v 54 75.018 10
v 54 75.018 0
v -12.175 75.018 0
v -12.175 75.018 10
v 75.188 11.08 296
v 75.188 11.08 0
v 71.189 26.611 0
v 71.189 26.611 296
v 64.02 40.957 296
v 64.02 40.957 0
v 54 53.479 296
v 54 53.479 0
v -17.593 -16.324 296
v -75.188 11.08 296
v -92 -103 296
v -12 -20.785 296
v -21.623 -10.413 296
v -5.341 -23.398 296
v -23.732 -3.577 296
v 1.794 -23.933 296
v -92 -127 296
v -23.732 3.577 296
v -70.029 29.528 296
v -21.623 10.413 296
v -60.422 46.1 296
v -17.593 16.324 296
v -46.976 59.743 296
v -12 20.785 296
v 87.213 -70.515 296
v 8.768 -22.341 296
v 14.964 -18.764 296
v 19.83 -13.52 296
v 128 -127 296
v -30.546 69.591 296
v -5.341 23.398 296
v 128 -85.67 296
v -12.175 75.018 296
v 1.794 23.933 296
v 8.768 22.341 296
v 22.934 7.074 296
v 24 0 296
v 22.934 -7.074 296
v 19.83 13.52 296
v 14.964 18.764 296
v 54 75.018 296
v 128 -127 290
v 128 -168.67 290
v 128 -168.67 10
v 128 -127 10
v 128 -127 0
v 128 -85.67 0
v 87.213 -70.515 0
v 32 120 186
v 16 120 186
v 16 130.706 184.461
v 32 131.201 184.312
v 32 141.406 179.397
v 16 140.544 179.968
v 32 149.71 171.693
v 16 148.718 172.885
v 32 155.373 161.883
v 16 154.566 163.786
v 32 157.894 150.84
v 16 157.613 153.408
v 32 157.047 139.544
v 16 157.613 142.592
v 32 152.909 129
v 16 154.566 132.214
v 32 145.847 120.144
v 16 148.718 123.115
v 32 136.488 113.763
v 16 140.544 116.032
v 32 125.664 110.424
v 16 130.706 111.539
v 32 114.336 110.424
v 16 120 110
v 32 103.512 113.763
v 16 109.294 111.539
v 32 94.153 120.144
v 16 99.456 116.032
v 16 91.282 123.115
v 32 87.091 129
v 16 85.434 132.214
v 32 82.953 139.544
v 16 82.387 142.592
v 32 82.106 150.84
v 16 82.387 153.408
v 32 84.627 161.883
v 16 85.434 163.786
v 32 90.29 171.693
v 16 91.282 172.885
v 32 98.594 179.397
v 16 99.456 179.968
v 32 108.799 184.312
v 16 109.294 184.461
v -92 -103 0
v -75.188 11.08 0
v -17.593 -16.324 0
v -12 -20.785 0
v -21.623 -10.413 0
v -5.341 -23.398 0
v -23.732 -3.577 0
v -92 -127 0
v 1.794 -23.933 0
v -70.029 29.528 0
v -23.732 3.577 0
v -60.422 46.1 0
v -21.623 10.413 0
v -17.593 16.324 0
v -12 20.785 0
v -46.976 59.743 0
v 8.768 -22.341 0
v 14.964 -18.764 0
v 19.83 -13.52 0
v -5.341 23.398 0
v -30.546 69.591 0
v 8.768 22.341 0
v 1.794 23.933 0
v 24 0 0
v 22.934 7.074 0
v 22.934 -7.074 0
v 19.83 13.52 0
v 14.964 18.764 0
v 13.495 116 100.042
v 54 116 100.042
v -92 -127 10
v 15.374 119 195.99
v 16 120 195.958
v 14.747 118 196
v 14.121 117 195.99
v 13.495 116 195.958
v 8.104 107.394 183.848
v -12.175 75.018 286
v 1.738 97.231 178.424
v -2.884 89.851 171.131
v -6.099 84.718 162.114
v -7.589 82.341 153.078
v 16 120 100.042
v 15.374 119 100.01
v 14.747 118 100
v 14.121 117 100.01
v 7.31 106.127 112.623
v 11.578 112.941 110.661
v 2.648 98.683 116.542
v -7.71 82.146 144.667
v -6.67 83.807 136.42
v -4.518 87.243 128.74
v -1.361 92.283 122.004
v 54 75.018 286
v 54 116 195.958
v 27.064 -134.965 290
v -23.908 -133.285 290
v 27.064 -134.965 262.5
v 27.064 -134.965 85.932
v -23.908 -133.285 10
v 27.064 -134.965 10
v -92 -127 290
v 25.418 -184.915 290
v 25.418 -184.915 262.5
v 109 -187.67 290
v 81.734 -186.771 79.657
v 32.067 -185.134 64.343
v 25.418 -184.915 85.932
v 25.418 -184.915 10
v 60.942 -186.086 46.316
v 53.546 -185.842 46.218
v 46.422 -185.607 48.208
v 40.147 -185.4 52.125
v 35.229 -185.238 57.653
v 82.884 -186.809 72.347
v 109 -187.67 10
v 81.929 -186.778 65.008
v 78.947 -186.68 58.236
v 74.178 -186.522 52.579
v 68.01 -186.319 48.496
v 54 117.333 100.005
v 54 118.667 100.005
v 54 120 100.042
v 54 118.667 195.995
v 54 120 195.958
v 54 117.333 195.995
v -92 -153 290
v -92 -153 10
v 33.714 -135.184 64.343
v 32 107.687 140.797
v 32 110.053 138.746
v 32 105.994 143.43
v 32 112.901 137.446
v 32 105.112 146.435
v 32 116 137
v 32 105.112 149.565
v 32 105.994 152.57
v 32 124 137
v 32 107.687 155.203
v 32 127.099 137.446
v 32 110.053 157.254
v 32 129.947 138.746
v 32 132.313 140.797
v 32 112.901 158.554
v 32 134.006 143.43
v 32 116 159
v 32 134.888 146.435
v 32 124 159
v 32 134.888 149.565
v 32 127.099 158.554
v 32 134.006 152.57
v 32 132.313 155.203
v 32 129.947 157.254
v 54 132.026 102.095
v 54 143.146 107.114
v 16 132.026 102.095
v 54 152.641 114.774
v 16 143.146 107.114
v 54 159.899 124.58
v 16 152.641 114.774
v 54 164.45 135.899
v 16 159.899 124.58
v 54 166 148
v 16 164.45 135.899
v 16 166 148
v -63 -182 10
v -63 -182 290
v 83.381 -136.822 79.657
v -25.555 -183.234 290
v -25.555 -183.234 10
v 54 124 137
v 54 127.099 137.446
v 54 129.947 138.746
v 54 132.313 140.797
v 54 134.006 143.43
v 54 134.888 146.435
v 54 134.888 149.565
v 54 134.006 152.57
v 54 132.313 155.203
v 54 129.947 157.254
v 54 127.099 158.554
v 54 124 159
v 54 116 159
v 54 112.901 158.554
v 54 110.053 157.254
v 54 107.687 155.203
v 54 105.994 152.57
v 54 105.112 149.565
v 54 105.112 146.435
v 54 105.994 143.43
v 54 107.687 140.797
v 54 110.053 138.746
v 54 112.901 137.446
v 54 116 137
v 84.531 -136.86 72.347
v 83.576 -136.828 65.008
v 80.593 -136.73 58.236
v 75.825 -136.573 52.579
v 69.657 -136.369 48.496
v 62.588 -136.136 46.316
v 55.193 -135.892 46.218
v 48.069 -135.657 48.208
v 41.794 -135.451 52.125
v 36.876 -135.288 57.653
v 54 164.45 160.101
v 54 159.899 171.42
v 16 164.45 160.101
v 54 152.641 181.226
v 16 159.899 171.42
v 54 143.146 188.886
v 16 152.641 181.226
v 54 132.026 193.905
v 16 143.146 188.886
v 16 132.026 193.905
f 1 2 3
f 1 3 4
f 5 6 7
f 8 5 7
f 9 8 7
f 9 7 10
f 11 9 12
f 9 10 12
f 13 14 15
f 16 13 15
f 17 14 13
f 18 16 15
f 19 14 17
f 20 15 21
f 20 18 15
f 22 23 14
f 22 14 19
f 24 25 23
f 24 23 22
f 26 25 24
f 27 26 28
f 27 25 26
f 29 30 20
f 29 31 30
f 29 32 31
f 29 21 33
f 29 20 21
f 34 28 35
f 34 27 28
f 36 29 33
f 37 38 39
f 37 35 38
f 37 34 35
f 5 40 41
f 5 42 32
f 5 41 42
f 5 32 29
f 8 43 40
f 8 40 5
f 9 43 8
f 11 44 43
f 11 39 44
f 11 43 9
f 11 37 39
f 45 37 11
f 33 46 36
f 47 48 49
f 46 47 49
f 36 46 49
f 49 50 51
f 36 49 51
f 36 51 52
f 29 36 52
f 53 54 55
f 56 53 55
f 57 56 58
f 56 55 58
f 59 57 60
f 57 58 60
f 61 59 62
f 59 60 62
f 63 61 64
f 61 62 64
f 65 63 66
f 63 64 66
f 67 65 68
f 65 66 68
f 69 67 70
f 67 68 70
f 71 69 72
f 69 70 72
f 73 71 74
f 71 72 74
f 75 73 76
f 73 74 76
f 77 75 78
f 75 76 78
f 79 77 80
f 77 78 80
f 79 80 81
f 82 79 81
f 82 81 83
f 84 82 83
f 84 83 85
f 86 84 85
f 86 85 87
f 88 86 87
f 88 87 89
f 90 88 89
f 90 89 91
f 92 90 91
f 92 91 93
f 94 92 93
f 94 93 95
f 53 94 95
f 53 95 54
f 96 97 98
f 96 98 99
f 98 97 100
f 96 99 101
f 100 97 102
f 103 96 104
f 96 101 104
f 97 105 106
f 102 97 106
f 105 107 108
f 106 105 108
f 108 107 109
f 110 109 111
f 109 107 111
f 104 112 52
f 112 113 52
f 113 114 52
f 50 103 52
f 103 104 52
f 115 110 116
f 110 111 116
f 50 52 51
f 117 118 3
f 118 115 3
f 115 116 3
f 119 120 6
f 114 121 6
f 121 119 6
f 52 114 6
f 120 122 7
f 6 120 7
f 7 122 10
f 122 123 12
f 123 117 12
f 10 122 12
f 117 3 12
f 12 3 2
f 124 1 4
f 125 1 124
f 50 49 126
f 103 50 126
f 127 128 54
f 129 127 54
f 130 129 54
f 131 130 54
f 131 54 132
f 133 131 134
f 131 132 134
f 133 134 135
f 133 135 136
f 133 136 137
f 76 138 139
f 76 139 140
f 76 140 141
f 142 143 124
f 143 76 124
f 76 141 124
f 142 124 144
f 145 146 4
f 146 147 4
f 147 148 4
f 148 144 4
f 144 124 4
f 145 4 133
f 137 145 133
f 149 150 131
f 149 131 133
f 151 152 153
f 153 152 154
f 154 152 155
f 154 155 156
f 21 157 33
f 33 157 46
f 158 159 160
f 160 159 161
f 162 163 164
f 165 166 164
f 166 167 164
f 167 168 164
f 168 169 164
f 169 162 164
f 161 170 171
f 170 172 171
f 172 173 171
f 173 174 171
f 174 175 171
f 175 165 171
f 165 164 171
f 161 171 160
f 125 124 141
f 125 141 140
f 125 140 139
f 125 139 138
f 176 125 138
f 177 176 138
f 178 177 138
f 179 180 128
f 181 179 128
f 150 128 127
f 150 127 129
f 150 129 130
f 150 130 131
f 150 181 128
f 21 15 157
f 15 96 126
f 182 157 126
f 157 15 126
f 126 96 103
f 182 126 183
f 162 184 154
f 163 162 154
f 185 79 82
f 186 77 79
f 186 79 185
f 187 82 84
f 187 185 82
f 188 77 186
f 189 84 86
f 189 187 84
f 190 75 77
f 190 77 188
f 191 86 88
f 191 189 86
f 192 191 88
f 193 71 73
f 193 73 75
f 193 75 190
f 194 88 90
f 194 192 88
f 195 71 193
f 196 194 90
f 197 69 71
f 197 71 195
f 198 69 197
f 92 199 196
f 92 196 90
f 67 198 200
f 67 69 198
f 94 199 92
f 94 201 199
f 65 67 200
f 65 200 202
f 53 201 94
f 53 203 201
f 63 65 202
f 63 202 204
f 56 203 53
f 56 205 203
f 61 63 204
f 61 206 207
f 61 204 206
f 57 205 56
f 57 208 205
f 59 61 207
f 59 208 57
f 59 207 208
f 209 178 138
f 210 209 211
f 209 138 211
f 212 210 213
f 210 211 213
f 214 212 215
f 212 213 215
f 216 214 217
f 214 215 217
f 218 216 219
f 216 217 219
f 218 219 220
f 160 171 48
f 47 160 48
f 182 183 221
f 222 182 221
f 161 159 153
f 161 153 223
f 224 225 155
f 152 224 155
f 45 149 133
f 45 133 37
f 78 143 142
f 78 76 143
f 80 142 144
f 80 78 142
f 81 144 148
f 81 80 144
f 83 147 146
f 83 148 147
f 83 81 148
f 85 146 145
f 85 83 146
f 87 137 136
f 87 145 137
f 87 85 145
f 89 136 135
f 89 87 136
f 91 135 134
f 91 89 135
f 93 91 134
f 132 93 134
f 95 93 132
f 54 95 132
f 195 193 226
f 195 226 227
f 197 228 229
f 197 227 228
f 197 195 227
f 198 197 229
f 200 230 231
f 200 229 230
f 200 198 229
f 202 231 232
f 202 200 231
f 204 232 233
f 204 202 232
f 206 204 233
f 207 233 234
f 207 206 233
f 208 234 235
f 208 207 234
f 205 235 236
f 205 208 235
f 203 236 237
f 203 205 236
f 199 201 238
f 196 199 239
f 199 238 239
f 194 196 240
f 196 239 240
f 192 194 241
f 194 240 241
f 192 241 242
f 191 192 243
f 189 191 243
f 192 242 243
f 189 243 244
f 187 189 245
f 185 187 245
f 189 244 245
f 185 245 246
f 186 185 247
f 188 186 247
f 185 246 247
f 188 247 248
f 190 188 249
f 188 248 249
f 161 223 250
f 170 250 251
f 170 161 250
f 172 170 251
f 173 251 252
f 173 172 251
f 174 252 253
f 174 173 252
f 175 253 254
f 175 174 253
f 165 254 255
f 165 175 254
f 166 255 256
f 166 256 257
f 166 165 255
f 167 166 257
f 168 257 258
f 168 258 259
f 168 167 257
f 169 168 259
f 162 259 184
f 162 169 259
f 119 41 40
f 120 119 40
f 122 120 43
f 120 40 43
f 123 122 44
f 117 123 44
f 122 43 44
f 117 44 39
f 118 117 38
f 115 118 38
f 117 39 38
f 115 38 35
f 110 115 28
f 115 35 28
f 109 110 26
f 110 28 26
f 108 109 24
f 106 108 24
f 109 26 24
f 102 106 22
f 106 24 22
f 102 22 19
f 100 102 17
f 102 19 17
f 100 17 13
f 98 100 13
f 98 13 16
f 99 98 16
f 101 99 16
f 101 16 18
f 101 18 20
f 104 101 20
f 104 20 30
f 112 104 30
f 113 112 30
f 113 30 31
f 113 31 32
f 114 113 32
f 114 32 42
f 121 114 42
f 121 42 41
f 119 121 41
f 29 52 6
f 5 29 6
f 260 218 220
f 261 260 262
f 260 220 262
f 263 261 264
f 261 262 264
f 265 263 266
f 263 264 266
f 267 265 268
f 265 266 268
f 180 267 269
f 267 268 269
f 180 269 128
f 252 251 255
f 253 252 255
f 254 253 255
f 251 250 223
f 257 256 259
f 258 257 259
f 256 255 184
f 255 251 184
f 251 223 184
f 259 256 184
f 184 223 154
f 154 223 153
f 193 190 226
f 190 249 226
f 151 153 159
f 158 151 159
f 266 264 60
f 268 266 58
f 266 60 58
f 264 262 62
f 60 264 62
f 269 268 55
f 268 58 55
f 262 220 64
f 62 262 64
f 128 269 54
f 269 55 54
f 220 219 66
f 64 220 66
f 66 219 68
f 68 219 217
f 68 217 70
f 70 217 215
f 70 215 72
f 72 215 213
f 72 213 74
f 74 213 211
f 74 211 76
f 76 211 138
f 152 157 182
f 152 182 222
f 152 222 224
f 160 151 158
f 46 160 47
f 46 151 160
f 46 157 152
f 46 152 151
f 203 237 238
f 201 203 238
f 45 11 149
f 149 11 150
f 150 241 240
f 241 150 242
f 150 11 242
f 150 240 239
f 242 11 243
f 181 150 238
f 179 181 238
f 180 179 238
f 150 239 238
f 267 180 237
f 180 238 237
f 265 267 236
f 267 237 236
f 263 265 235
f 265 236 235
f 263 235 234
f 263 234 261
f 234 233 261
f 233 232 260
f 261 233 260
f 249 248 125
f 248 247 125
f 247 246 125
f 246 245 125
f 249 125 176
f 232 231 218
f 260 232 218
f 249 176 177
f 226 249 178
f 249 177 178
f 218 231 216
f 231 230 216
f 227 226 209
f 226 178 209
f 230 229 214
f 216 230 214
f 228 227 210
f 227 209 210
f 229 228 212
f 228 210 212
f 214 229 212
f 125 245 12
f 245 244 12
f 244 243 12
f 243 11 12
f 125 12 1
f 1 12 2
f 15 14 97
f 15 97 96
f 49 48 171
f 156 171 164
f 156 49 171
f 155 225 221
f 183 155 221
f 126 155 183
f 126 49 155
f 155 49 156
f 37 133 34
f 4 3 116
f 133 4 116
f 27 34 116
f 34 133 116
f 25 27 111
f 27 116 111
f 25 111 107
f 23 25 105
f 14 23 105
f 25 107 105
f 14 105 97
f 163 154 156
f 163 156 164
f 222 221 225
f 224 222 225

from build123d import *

# Parameters (mm, degrees)
EXTRUDE_1_DEPTH                  = 296
CUT_EXTRUDE_1_REACH              = 375.122
SKETCH_2_R                       = 24
EXTRUDE_START                    = -296
EXTRUDE_2_DEPTH                  = 296
CUT_EXTRUDE_2_REACH              = 369.94
CUT_EXTRUDE_2_DIRECTION_2_REACH  = 369.94
SKETCH_5_R                       = 38
CUT_EXTRUDE_4_DEPTH              = 16
CUT_EXTRUDE_4_DIRECTION_2_REACH  = 369.94
CUT_EXTRUDE_10_REACH             = 369.94
CUT_EXTRUDE_11_REACH             = 369.94
CUT_EXTRUDE_12_REACH             = 369.94
CUT_EXTRUDE_12_DIRECTION_2_REACH = 369.94
CUT_EXTRUDE_1_2_DEPTH            = 374.122168517
CUT_EXTRUDE_1_2_DEPTH_BACK       = 6
SKETCH_10_W                      = 353.554121084
SKETCH_10_H                      = 70
CUT_EXTRUDE_2_2_DEPTH            = 374.122168517
CUT_EXTRUDE_2_2_DEPTH_BACK       = 10
SKETCH_11_W                      = 315.319296241
SKETCH_11_H                      = 70
CUT_EXTRUDE_13_DEPTH             = 49.976974814


with BuildPart() as part:
    # 草图1 → 凸台-拉伸1 (new body)
    with BuildSketch(Plane.XY):
        with BuildLine():
            Line((-75.187918949, 11.080471294), (-92, -103))
            Line((-92, -103), (-92, -153))
            Line((-92, -153), (-63, -182))
            Line((-63, -182), (-25.55454992, -183.234465387))
            Line((-25.55454992, -183.234465387), (-23.907851937, -133.284626575))
            Line((-23.907851937, -133.284626575), (27.064456588, -134.965032351))
            Line((27.064456588, -134.965032351), (25.417758605, -184.914871163))
            Line((25.417758605, -184.914871163), (109, -187.67032967))
            Line((109, -187.67032967), (128, -168.67032967))
            Line((128, -168.67032967), (128, -85.67032967))
            Line((128, -85.67032967), (87.212696765, -70.515157246))
            Line((87.212696765, -70.515157246), (75.187918949, 11.080471294))
            ThreePointArc((75.187918949, 11.080471294), (0, 76), (-75.187918949, 11.080471294))
        make_face()
    extrude(amount=EXTRUDE_1_DEPTH)

    # 草图2 → Cut-Extrude 1 (cut, up to next)
    with BuildSketch(Plane.XY.offset(296), mode=Mode.PRIVATE) as cut_extrude_1_sk1:
        Circle(SKETCH_2_R)
    cut_extrude_1_tool1 = extrude(cut_extrude_1_sk1.sketch, amount=-CUT_EXTRUDE_1_REACH, mode=Mode.PRIVATE) & part.part
    add(cut_extrude_1_tool1.solids().sort_by_distance((0, 0, 296))[0], mode=Mode.SUBTRACT)

    # 草图3 → 凸台-拉伸2 (add)
    with BuildSketch(Plane.XY.offset(296).offset(EXTRUDE_START)):
        with BuildLine():
            Line((54, 53.478967828), (54, 166))
            Line((54, 166), (16, 166))
            Line((16, 166), (16, 120))
            Line((16, 120), (-12.175135195, 75.018438287))
            ThreePointArc((-12.175135195, 75.018438287), (23.522691723, 72.268132494), (54, 53.478967828))
        make_face()
    extrude(amount=EXTRUDE_2_DEPTH)

    # 草图4 → Cut-Extrude 2 (cut, up to next)
    with BuildSketch(Plane.ZY.offset(-16), mode=Mode.PRIVATE) as cut_extrude_2_sk1:
        with BuildLine():
            Line((159, 124), (159, 116))
            ThreePointArc((159, 116), (148, 105), (137, 116))
            Line((137, 116), (137, 124))
            ThreePointArc((137, 124), (148, 135), (159, 124))
        make_face()
    cut_extrude_2_tool1 = extrude(cut_extrude_2_sk1.sketch, amount=-CUT_EXTRUDE_2_REACH, mode=Mode.PRIVATE) & part.part
    add(cut_extrude_2_tool1.solids().sort_by_distance((16, 120, 148))[0], mode=Mode.SUBTRACT)

    # 草图4 → Cut-Extrude 2 direction 2 (cut, up to next)
    with BuildSketch(Plane.ZY.offset(-16), mode=Mode.PRIVATE) as cut_extrude_2_direction_2_sk1:
        with BuildLine():
            Line((159, 124), (159, 116))
            ThreePointArc((159, 116), (148, 105), (137, 116))
            Line((137, 116), (137, 124))
            ThreePointArc((137, 124), (148, 135), (159, 124))
        make_face()
    cut_extrude_2_direction_2_tool1 = extrude(cut_extrude_2_direction_2_sk1.sketch, amount=CUT_EXTRUDE_2_DIRECTION_2_REACH, mode=Mode.PRIVATE) & part.part
    add(cut_extrude_2_direction_2_tool1.solids().sort_by_distance((16, 120, 148))[0], mode=Mode.SUBTRACT)

    # 草图5 → 切除-拉伸4 (cut)
    with BuildSketch(Plane.ZY.offset(-16)):
        with Locations((148, 120)):
            Circle(SKETCH_5_R)
    extrude(amount=-CUT_EXTRUDE_4_DEPTH, mode=Mode.SUBTRACT)

    # 草图5 → 切除-拉伸4 direction 2 (cut, up to next)
    with BuildSketch(Plane.ZY.offset(-16), mode=Mode.PRIVATE) as cut_extrude_4_direction_2_sk1:
        with Locations((148, 120)):
            Circle(SKETCH_5_R)
    cut_extrude_4_direction_2_tool1 = extrude(cut_extrude_4_direction_2_sk1.sketch, amount=CUT_EXTRUDE_4_DIRECTION_2_REACH, mode=Mode.PRIVATE) & part.part
    add(cut_extrude_4_direction_2_tool1.solids().sort_by_distance((16, 120, 148))[0], mode=Mode.SUBTRACT)

    # 草图6 → 切除-拉伸10 (cut, up to next)
    with BuildSketch(Plane.ZY.offset(-16), mode=Mode.PRIVATE) as cut_extrude_10_sk1:
        with BuildLine():
            Line((195.958315233, 120), (296, 120))
            Line((296, 120), (296, 166))
            Line((296, 166), (148, 166))
            ThreePointArc((148, 166), (181.226495452, 152.641016151), (195.958315233, 120))
        make_face()
    cut_extrude_10_tool1 = extrude(cut_extrude_10_sk1.sketch, amount=-CUT_EXTRUDE_10_REACH, mode=Mode.PRIVATE) & part.part
    add(cut_extrude_10_tool1.solids().sort_by_distance((16, 144.191812, 240.106882))[0], mode=Mode.SUBTRACT)

    # 草图6<5> → 切除-拉伸11 (cut, up to next)
    with BuildSketch(Plane.ZY.offset(-16), mode=Mode.PRIVATE) as cut_extrude_11_sk1:
        with BuildLine():
            ThreePointArc((100.041684767, 120), (114.773504548, 152.641016151), (148, 166))
            Line((148, 166), (0, 166))
            Line((0, 166), (0, 120))
            Line((0, 120), (100.041684767, 120))
        make_face()
    cut_extrude_11_tool1 = extrude(cut_extrude_11_sk1.sketch, amount=-CUT_EXTRUDE_11_REACH, mode=Mode.PRIVATE) & part.part
    add(cut_extrude_11_tool1.solids().sort_by_distance((16, 144.191812, 55.893118))[0], mode=Mode.SUBTRACT)

    # 草图6<6> → 切除-拉伸12 (cut, up to next)
    with BuildSketch(Plane.ZY.offset(-16), mode=Mode.PRIVATE) as cut_extrude_12_sk1:
        with BuildLine():
            ThreePointArc((100.041684767, 116), (100, 118), (100.041684767, 120))
            Line((100.041684767, 120), (0, 120))
            Line((0, 120), (0, 75.018438287))
            Line((0, 75.018438287), (10, 75.018438287))
            Line((10, 75.018438287), (100.041684767, 116))
        make_face()
    cut_extrude_12_tool1 = extrude(cut_extrude_12_sk1.sketch, amount=-CUT_EXTRUDE_12_REACH, mode=Mode.PRIVATE) & part.part
    # 草图6<6> → 切除-拉伸12 (cut, up to next)
    with BuildSketch(Plane.ZY.offset(-16), mode=Mode.PRIVATE) as cut_extrude_12_sk2:
        with BuildLine():
            Line((286, 75.018438287), (296, 75.018438287))
            Line((296, 75.018438287), (296, 120))
            Line((296, 120), (195.958315233, 120))
            ThreePointArc((195.958315233, 120), (196, 118), (195.958315233, 116))
            Line((195.958315233, 116), (286, 75.018438287))
        make_face()
    cut_extrude_12_tool2 = extrude(cut_extrude_12_sk2.sketch, amount=-CUT_EXTRUDE_12_REACH, mode=Mode.PRIVATE) & part.part
    add(cut_extrude_12_tool1.solids().sort_by_distance((16, 103.644966, 36.114885))[0], mode=Mode.SUBTRACT)
    add(cut_extrude_12_tool2.solids().sort_by_distance((16, 103.644966, 259.885115))[0], mode=Mode.SUBTRACT)

    # 草图6<6> → 切除-拉伸12 direction 2 (cut, up to next)
    with BuildSketch(Plane.ZY.offset(-16), mode=Mode.PRIVATE) as cut_extrude_12_direction_2_sk1:
        with BuildLine():
            ThreePointArc((100.041684767, 116), (100, 118), (100.041684767, 120))
            Line((100.041684767, 120), (0, 120))
            Line((0, 120), (0, 75.018438287))
            Line((0, 75.018438287), (10, 75.018438287))
            Line((10, 75.018438287), (100.041684767, 116))
        make_face()
    cut_extrude_12_direction_2_tool1 = extrude(cut_extrude_12_direction_2_sk1.sketch, amount=CUT_EXTRUDE_12_DIRECTION_2_REACH, mode=Mode.PRIVATE) & part.part
    # 草图6<6> → 切除-拉伸12 direction 2 (cut, up to next)
    with BuildSketch(Plane.ZY.offset(-16), mode=Mode.PRIVATE) as cut_extrude_12_direction_2_sk2:
        with BuildLine():
            Line((286, 75.018438287), (296, 75.018438287))
            Line((296, 75.018438287), (296, 120))
            Line((296, 120), (195.958315233, 120))
            ThreePointArc((195.958315233, 120), (196, 118), (195.958315233, 116))
            Line((195.958315233, 116), (286, 75.018438287))
        make_face()
    cut_extrude_12_direction_2_tool2 = extrude(cut_extrude_12_direction_2_sk2.sketch, amount=CUT_EXTRUDE_12_DIRECTION_2_REACH, mode=Mode.PRIVATE) & part.part
    add(cut_extrude_12_direction_2_tool1.solids().sort_by_distance((16, 103.644966, 36.114885))[0], mode=Mode.SUBTRACT)
    add(cut_extrude_12_direction_2_tool2.solids().sort_by_distance((16, 103.644966, 259.885115))[0], mode=Mode.SUBTRACT)

    # 草图10 → Cut-Extrude 1 2 (cut, two sides: drawn at the far end of the back side and taken through both)
    with BuildSketch(Plane.XY.offset(296).offset(-CUT_EXTRUDE_1_2_DEPTH_BACK)):
        with Locations((35.701307798, -162)):
            Rectangle(SKETCH_10_W, SKETCH_10_H)
    extrude(amount=CUT_EXTRUDE_1_2_DEPTH + CUT_EXTRUDE_1_2_DEPTH_BACK, mode=Mode.SUBTRACT)

    # 草图11 → Cut-Extrude 2 2 (cut, two sides: drawn at the far end of the back side and taken through both)
    with BuildSketch(Plane(origin=(0, 0, 0), x_dir=(-1, 0, 0), z_dir=(0, 0, -1)).offset(-CUT_EXTRUDE_2_2_DEPTH_BACK)):
        with Locations((-8.559302508, -162)):
            Rectangle(SKETCH_11_W, SKETCH_11_H)
    extrude(amount=CUT_EXTRUDE_2_2_DEPTH + CUT_EXTRUDE_2_2_DEPTH_BACK, mode=Mode.SUBTRACT)

    # 草图12 → 切除-拉伸13 (cut)
    with BuildSketch(Plane(origin=(-6.061881785, -183.87708082, 0), x_dir=(0.9994570299138168, -0.032949132854323, 0), z_dir=(-0.032949132854323, -0.9994570299138168, 0))):
        with BuildLine():
            Line((31.496742179, 262.5), (87.843649763, 79.657100204))
            ThreePointArc((87.843649763, 79.657100204), (70.653842384, 47.153092416), (38.149834596, 64.342899796))
            Line((38.149834596, 64.342899796), (31.496742179, 85.931852273))
            Line((31.496742179, 85.931852273), (31.496742179, 262.5))
        make_face()
    extrude(amount=-CUT_EXTRUDE_13_DEPTH, mode=Mode.SUBTRACT)


solid = part.part
